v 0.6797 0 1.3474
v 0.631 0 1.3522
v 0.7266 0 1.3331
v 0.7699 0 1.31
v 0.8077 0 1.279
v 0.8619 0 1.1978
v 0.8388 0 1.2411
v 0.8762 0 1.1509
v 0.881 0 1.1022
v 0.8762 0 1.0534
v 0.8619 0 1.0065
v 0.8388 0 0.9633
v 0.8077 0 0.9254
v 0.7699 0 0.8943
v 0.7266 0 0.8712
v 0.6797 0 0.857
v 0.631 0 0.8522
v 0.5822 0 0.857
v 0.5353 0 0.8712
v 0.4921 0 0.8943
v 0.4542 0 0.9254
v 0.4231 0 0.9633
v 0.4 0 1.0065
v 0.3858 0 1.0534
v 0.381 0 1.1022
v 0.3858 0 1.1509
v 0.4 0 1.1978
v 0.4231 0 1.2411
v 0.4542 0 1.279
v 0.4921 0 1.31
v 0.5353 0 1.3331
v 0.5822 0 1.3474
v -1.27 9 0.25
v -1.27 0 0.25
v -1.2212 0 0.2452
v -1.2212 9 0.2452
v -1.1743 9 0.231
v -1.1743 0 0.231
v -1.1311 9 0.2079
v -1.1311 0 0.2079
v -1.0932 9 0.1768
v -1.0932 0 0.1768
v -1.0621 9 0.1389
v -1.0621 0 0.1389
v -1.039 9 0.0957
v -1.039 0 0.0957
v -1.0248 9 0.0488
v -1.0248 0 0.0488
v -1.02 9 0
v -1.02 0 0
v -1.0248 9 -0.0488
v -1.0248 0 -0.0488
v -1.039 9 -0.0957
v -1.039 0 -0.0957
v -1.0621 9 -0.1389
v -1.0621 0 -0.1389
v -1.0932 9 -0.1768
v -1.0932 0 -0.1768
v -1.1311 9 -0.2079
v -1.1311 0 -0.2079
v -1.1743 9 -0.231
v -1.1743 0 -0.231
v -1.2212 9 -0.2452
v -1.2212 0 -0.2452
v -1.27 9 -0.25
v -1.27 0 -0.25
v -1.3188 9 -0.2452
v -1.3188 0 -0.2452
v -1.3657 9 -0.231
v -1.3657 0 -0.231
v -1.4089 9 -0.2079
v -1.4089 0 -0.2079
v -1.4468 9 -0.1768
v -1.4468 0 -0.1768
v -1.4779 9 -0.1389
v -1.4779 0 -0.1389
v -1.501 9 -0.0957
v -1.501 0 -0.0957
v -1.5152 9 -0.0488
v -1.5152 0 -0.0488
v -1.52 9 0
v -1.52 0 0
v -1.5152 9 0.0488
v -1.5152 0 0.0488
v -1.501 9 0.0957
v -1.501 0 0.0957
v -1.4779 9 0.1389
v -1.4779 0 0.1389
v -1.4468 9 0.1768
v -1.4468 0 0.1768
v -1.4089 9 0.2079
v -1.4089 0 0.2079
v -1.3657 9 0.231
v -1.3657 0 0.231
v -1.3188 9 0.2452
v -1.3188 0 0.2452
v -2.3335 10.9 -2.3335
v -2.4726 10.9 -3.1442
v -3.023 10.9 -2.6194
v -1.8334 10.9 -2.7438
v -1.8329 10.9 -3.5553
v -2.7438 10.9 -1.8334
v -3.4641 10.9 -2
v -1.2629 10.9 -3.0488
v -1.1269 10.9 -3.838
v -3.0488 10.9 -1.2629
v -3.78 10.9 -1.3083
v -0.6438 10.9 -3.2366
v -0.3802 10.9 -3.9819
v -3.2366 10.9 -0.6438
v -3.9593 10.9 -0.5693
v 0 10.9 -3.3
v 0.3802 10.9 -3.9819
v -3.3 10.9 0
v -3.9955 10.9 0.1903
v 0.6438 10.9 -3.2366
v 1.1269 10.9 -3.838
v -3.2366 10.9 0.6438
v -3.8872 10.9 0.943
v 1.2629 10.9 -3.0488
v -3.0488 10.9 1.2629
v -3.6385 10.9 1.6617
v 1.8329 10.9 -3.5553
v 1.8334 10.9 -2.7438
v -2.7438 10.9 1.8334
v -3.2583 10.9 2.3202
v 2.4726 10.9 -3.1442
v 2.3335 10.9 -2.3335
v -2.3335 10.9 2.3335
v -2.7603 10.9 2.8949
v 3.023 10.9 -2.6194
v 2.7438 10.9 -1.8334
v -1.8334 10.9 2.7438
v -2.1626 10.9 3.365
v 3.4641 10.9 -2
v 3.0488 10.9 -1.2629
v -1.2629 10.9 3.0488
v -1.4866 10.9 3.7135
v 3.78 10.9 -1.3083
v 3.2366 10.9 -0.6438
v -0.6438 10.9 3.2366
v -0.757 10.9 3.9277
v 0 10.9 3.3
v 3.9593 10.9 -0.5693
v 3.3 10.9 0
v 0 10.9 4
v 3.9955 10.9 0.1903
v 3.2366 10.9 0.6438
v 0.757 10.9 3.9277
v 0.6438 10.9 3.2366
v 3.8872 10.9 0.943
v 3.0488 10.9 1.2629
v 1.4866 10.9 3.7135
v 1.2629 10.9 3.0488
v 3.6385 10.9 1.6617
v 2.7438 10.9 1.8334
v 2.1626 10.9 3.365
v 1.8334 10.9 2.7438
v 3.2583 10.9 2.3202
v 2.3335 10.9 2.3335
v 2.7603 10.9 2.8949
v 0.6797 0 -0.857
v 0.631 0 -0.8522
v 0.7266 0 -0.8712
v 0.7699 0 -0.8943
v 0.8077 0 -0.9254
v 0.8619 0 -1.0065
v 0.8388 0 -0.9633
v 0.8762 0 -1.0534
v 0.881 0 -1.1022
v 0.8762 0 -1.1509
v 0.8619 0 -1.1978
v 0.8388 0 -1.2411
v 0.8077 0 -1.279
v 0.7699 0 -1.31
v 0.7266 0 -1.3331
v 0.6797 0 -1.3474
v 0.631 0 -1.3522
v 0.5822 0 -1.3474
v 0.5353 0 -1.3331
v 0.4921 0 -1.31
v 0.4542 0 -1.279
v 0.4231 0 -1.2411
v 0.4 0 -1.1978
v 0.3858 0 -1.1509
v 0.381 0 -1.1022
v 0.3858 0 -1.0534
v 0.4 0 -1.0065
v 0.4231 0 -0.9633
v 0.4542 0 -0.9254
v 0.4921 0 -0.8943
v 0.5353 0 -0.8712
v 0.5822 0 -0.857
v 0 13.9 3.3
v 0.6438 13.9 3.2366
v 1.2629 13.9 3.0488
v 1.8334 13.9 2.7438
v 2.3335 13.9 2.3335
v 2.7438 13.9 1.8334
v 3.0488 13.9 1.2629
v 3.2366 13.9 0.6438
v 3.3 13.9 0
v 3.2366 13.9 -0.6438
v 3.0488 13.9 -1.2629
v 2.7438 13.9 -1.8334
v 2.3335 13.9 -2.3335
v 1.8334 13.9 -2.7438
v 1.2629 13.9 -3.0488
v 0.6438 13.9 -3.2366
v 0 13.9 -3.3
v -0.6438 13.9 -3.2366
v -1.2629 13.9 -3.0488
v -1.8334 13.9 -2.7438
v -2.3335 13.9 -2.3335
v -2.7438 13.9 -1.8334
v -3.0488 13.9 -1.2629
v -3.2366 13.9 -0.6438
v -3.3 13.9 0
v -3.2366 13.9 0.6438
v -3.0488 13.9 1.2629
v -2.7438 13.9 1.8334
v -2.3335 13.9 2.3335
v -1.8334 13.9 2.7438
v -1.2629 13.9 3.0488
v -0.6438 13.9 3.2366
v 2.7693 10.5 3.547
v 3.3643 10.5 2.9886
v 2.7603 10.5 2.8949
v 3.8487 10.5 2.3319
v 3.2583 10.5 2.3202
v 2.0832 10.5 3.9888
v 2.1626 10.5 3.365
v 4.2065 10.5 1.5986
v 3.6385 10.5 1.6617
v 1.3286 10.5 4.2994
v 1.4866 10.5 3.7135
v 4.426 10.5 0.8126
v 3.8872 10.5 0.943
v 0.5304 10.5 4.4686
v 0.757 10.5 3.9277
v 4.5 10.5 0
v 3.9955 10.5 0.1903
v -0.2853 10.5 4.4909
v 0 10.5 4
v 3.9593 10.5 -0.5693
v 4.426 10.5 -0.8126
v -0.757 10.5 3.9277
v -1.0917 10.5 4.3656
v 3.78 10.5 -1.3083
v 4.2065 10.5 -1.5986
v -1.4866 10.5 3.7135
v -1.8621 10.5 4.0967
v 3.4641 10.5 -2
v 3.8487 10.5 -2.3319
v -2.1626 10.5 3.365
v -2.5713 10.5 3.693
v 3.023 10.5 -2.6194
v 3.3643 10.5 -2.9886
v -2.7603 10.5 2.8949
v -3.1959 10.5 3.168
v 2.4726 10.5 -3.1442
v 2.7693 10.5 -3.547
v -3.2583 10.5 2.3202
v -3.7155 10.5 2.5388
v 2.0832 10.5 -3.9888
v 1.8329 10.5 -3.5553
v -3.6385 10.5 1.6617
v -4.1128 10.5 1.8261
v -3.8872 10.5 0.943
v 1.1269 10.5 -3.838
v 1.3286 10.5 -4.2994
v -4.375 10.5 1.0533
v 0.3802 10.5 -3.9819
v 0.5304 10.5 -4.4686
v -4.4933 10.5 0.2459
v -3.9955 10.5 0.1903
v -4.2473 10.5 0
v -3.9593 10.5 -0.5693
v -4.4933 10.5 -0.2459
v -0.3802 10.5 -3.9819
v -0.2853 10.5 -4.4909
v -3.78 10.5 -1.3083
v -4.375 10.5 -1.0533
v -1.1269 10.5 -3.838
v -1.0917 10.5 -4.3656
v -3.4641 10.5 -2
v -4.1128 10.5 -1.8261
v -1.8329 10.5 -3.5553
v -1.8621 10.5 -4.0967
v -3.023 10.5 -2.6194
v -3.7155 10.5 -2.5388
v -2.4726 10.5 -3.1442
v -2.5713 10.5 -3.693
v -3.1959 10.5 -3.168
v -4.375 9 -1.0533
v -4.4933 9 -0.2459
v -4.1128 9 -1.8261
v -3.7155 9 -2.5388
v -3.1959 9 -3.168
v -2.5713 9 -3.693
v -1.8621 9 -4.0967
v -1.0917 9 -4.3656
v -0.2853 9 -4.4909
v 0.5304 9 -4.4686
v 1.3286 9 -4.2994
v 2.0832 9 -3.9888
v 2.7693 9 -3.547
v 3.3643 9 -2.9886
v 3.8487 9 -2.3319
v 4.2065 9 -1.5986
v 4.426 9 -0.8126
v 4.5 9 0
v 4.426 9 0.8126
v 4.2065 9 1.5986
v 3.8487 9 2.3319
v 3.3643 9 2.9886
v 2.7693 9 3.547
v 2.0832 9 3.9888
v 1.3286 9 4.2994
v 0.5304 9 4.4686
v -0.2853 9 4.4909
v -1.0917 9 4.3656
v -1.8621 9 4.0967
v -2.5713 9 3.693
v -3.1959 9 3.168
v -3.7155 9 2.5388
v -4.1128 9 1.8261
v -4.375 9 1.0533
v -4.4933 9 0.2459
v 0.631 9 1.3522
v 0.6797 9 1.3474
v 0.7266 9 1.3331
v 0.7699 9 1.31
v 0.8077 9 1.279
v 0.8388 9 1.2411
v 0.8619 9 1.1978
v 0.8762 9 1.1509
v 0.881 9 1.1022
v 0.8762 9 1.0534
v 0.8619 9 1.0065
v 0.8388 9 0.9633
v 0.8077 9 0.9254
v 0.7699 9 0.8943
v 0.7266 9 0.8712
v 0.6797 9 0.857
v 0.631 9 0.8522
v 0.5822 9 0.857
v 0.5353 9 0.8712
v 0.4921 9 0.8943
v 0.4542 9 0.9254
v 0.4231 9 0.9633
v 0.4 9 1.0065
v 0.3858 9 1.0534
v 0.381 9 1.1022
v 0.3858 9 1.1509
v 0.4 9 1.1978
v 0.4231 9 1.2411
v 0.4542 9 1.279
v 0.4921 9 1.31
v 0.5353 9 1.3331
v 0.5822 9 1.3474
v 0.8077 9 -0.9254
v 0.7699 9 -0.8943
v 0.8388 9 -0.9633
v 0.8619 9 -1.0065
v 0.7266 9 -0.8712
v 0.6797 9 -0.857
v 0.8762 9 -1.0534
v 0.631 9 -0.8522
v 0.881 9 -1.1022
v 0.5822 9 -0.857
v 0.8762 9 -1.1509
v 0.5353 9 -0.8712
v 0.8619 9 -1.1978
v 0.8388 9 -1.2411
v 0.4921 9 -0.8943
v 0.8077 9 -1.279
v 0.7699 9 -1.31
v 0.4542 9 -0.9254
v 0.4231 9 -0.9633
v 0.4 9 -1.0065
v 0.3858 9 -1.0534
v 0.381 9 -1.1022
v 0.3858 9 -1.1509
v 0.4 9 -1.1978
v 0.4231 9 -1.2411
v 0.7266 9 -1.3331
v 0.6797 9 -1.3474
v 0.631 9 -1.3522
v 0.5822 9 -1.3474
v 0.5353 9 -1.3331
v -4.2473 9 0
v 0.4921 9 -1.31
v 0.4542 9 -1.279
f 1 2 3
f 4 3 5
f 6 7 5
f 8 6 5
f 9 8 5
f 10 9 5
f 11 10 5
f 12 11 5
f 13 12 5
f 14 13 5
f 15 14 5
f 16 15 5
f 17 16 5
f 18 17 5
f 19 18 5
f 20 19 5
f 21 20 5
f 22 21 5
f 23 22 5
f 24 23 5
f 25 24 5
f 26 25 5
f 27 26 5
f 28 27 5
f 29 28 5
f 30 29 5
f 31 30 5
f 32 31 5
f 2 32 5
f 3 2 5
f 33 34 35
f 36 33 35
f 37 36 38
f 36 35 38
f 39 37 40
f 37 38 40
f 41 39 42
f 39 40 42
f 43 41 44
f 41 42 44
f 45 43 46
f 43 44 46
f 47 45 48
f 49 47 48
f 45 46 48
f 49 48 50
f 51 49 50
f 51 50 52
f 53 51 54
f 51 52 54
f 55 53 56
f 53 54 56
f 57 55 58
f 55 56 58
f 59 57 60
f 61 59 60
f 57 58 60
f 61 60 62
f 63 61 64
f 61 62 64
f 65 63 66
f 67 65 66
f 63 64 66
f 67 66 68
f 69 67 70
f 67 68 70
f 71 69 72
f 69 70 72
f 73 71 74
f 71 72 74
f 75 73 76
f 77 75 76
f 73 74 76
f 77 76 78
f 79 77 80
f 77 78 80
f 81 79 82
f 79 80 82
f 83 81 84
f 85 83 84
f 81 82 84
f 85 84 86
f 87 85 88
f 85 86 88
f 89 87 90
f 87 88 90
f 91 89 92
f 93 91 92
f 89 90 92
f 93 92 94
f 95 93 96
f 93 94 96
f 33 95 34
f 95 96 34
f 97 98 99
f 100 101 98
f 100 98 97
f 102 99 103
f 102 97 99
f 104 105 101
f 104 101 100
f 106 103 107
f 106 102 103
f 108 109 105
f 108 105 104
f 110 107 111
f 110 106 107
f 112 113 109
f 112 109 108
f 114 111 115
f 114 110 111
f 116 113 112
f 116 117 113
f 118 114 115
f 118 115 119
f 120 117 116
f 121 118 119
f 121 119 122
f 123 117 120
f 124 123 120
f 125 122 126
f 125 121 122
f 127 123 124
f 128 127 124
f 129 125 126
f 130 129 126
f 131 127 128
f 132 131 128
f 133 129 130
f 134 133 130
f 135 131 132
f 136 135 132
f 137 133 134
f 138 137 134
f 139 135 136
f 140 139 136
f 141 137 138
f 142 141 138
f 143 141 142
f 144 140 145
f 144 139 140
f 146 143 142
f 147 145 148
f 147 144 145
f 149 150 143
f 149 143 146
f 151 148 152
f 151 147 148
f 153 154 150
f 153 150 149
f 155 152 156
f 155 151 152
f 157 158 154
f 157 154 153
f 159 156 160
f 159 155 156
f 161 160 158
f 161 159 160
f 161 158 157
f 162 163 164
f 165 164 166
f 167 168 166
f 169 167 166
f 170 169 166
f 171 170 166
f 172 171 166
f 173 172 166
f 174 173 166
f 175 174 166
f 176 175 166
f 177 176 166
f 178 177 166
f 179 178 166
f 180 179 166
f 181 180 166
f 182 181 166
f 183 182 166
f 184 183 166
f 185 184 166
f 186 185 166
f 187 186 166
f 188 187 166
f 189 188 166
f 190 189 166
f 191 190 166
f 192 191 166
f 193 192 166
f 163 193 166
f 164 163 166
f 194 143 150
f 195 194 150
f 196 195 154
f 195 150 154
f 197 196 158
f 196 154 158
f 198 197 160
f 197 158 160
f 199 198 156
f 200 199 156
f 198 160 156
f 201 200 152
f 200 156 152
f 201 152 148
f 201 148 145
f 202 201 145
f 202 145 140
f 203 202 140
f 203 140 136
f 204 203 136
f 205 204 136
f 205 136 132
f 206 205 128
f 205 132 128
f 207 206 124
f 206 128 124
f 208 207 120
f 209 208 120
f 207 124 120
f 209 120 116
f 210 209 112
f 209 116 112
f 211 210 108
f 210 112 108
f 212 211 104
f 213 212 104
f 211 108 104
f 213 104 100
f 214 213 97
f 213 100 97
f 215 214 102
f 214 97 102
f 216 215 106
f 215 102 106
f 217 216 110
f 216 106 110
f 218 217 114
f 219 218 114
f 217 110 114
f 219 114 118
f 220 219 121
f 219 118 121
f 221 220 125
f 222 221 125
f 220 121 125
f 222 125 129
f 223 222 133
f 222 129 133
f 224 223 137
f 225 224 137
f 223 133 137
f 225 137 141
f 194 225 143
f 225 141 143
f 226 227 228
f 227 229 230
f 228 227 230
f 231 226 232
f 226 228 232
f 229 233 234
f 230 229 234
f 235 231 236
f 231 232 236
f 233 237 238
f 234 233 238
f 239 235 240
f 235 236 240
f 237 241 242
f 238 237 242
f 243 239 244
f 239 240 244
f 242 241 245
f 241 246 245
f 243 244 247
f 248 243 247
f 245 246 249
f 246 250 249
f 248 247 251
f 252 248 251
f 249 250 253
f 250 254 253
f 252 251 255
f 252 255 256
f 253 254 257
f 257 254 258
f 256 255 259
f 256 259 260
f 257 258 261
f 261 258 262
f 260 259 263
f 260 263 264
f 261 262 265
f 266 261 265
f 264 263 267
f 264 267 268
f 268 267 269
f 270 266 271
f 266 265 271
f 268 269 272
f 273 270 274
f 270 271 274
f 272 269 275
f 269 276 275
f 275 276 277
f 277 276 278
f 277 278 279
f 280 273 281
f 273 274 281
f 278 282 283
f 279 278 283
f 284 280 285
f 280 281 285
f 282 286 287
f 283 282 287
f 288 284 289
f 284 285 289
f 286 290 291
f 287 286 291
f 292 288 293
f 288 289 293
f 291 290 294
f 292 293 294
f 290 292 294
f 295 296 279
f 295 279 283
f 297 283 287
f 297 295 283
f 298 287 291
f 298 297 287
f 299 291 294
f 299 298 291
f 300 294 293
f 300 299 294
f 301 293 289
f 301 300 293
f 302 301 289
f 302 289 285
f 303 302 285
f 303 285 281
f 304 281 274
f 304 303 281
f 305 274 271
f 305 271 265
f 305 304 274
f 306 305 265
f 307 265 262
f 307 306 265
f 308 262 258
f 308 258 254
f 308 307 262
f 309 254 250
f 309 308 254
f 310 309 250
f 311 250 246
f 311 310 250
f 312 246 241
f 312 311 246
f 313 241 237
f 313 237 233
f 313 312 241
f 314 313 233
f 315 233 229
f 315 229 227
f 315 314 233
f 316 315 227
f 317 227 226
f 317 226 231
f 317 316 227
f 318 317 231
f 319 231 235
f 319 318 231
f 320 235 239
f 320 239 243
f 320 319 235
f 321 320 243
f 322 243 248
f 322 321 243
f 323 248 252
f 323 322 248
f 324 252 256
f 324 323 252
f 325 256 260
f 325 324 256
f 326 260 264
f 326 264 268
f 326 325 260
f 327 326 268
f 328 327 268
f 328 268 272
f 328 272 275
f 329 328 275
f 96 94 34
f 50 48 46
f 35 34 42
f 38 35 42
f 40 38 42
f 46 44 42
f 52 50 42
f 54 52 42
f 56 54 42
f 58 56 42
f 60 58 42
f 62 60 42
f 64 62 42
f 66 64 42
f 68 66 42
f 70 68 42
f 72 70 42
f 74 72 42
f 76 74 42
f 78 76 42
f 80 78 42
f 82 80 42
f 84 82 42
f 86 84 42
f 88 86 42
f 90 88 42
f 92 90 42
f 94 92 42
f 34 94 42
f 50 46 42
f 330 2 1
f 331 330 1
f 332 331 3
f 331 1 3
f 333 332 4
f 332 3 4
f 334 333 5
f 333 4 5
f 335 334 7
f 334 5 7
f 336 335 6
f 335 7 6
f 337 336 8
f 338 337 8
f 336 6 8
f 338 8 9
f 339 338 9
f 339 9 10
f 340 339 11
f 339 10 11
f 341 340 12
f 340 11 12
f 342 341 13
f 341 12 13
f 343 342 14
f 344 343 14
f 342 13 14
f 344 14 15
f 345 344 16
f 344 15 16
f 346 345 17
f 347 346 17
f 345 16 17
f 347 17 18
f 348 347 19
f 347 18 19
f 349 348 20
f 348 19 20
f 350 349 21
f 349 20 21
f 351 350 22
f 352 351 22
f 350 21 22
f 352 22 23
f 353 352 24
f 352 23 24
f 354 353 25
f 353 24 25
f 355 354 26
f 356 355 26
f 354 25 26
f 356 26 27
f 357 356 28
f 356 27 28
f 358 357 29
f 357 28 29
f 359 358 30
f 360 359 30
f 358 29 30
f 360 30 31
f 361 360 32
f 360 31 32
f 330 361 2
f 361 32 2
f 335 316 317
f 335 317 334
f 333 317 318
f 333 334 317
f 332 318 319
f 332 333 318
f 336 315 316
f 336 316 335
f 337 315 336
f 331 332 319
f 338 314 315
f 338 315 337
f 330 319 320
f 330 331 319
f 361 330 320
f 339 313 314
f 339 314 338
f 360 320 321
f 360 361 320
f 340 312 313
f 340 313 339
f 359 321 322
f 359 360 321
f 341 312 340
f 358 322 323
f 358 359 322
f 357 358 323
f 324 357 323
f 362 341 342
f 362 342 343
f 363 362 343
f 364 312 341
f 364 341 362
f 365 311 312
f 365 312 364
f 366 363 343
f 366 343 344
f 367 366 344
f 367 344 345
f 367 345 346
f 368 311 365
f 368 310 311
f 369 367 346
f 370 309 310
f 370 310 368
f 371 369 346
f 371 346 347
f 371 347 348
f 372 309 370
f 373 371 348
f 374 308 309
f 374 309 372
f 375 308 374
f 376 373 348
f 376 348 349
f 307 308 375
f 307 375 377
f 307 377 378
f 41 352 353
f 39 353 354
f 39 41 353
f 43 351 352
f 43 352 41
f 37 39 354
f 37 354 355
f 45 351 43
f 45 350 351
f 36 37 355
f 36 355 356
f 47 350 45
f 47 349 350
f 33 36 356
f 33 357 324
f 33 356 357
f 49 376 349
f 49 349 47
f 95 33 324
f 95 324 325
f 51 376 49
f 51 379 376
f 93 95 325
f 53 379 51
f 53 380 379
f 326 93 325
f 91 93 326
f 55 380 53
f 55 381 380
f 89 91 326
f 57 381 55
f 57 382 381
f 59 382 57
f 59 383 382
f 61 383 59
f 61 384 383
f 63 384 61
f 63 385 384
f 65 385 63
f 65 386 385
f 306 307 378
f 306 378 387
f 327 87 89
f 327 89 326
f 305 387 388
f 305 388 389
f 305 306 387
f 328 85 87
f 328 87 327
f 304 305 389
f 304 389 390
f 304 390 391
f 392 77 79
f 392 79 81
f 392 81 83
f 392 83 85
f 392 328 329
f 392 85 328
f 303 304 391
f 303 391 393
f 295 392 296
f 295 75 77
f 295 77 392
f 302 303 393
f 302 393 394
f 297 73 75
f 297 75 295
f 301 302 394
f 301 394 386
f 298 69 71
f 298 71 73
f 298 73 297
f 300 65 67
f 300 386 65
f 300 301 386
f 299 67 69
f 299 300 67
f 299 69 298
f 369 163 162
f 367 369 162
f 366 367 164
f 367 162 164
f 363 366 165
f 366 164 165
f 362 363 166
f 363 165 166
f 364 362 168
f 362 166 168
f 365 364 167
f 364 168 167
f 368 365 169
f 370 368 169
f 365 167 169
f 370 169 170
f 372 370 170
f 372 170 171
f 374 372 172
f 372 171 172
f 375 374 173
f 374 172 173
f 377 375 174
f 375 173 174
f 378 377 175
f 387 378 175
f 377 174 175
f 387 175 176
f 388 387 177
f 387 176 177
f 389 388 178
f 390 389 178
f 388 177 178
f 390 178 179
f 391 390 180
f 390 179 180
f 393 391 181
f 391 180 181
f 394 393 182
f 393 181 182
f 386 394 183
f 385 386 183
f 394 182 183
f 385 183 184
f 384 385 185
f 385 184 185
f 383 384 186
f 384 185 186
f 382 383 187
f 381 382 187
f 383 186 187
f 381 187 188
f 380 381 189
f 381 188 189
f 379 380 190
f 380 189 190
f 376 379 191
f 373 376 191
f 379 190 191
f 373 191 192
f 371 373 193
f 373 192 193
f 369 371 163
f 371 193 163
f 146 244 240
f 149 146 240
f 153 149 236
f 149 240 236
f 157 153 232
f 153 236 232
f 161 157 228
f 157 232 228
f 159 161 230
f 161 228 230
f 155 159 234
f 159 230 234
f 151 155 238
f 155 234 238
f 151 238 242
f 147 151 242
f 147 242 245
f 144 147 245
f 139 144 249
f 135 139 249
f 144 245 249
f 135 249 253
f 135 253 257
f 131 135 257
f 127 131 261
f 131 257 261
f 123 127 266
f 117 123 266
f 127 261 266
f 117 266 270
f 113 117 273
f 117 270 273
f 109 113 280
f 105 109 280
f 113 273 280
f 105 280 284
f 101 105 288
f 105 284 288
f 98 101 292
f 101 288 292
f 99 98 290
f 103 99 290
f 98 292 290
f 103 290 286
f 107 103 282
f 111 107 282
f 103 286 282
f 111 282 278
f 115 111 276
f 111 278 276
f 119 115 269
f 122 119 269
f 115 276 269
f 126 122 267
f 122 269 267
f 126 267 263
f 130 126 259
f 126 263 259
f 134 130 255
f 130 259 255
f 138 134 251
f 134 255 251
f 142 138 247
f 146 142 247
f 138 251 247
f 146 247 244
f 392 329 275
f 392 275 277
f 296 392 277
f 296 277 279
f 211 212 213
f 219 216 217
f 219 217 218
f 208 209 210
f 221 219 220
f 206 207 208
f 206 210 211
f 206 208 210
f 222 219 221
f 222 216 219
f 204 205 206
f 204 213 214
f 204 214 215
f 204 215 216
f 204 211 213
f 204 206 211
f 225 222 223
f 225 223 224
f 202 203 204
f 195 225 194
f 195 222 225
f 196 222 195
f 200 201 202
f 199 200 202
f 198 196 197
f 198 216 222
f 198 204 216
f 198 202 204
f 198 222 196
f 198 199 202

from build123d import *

# Parameters (mm, degrees)
SKETCH_2_R        = 0.25
EXTRUDE_1_DEPTH   = 9
EXTRUDE_1_2_DEPTH = 9
EXTRUDE_1_3_DEPTH = 9
EXTRUDE_2_DEPTH   = 1.5
SKETCH_4_R        = 4
EXTRUDE_3_DEPTH   = 0.4
SKETCH_5_R        = 3.3
EXTRUDE_4_DEPTH   = 3


with BuildPart() as part:
    # Эскиз2 → Бобышка-Вытянуть1 (new body)
    with BuildSketch(Plane(origin=(0, 0, 0), x_dir=(1, 0, 0), z_dir=(0, 1, 0))):
        with Locations(Location((-1.27, 0, 0), (0, 0, 270))):
            Circle(SKETCH_2_R)
    extrude(amount=EXTRUDE_1_DEPTH)



with BuildPart() as body_2:
    # Эскиз2 → Extrude 1 2 (new body)
    with BuildSketch(Plane(origin=(0, 0, 0), x_dir=(1, 0, 0), z_dir=(0, 1, 0))):
        with Locations(Location((0.630957819, 1.102176134, 0), (0, 0, 270))):
            Circle(SKETCH_2_R)
    extrude(amount=EXTRUDE_1_2_DEPTH)


with BuildPart() as body_3:
    # Эскиз2 → Extrude 1 3 (new body)
    with BuildSketch(Plane(origin=(0, 0, 0), x_dir=(1, 0, 0), z_dir=(0, 1, 0))):
        with Locations(Location((0.630957819, -1.102176134, 0), (0, 0, 270))):
            Circle(SKETCH_2_R)
    extrude(amount=EXTRUDE_1_3_DEPTH)


with BuildPart() as part_1:
    add(part.part)

    add(body_2.part)  # Бобышка-Вытянуть2 merges body 2

    add(body_3.part)  # Бобышка-Вытянуть2 merges body 3
    # Эскиз3 → Бобышка-Вытянуть2 (add)
    with BuildSketch(Plane(origin=(0, 9, 0), x_dir=(1, 0, 0), z_dir=(0, 1, 0))):
        with BuildLine():
            Line((-4.247340401, 0), (-4.493274572, 0.245934171))
            ThreePointArc((-4.493274572, 0.245934171), (4.5, 0), (-4.493274572, -0.245934171))
            Line((-4.493274572, -0.245934171), (-4.247340401, 0))
        make_face()
    extrude(amount=EXTRUDE_2_DEPTH)

    # Эскиз4 → Бобышка-Вытянуть3 (add)
    with BuildSketch(Plane(origin=(0, 10.5, 0), x_dir=(1, 0, 0), z_dir=(0, 1, 0))):
        with Locations(Location((0, 0, 0), (0, 0, 270))):
            Circle(SKETCH_4_R)
    extrude(amount=EXTRUDE_3_DEPTH)

    # Эскиз5 → Бобышка-Вытянуть4 (add)
    with BuildSketch(Plane(origin=(0, 10.9, 0), x_dir=(1, 0, 0), z_dir=(0, 1, 0))):
        with Locations(Location((0, 0, 0), (0, 0, 270))):
            Circle(SKETCH_5_R)
    extrude(amount=EXTRUDE_4_DEPTH)


solid = part_1.part
